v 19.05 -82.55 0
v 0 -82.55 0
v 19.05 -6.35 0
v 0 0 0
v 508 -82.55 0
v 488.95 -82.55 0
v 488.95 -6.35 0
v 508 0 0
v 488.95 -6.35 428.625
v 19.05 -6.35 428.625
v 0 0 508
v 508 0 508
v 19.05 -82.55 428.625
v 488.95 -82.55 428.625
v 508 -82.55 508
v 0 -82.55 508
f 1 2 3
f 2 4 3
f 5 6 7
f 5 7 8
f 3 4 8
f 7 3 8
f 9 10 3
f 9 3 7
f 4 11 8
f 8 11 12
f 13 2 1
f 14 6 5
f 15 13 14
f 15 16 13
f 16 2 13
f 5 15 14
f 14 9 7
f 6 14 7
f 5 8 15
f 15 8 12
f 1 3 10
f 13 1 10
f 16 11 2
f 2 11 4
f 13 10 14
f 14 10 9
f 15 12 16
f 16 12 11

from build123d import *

# Parameters (mm, degrees)
F0_W     = 508
F0_H     = 508
F2_DEPTH = 6.35
F3_W     = 469.9
F3_H     = 79.375
F4_DEPTH = 76.2


with BuildPart() as f2:
    # F0 (on Front) → F2 (new body)
    with BuildSketch(Plane.XZ):
        with Locations((254, 254)):
            Rectangle(F0_W, F0_H)
    extrude(amount=F2_DEPTH)

    # F3 (on face) → F4 (join)
    with BuildSketch(Plane.XZ.offset(6.35)):
        Polygon((0, 508), (0, 0), (19.05, 0), (19.05, 428.625), (19.05, 508), align=None)
        with Locations((254, 468.3125)):
            Rectangle(F3_W, F3_H)
        Polygon((488.95, 508), (488.95, 428.625), (488.95, 0), (508, 0), (508, 508), align=None)
    extrude(amount=F4_DEPTH)


solid = f2.part
